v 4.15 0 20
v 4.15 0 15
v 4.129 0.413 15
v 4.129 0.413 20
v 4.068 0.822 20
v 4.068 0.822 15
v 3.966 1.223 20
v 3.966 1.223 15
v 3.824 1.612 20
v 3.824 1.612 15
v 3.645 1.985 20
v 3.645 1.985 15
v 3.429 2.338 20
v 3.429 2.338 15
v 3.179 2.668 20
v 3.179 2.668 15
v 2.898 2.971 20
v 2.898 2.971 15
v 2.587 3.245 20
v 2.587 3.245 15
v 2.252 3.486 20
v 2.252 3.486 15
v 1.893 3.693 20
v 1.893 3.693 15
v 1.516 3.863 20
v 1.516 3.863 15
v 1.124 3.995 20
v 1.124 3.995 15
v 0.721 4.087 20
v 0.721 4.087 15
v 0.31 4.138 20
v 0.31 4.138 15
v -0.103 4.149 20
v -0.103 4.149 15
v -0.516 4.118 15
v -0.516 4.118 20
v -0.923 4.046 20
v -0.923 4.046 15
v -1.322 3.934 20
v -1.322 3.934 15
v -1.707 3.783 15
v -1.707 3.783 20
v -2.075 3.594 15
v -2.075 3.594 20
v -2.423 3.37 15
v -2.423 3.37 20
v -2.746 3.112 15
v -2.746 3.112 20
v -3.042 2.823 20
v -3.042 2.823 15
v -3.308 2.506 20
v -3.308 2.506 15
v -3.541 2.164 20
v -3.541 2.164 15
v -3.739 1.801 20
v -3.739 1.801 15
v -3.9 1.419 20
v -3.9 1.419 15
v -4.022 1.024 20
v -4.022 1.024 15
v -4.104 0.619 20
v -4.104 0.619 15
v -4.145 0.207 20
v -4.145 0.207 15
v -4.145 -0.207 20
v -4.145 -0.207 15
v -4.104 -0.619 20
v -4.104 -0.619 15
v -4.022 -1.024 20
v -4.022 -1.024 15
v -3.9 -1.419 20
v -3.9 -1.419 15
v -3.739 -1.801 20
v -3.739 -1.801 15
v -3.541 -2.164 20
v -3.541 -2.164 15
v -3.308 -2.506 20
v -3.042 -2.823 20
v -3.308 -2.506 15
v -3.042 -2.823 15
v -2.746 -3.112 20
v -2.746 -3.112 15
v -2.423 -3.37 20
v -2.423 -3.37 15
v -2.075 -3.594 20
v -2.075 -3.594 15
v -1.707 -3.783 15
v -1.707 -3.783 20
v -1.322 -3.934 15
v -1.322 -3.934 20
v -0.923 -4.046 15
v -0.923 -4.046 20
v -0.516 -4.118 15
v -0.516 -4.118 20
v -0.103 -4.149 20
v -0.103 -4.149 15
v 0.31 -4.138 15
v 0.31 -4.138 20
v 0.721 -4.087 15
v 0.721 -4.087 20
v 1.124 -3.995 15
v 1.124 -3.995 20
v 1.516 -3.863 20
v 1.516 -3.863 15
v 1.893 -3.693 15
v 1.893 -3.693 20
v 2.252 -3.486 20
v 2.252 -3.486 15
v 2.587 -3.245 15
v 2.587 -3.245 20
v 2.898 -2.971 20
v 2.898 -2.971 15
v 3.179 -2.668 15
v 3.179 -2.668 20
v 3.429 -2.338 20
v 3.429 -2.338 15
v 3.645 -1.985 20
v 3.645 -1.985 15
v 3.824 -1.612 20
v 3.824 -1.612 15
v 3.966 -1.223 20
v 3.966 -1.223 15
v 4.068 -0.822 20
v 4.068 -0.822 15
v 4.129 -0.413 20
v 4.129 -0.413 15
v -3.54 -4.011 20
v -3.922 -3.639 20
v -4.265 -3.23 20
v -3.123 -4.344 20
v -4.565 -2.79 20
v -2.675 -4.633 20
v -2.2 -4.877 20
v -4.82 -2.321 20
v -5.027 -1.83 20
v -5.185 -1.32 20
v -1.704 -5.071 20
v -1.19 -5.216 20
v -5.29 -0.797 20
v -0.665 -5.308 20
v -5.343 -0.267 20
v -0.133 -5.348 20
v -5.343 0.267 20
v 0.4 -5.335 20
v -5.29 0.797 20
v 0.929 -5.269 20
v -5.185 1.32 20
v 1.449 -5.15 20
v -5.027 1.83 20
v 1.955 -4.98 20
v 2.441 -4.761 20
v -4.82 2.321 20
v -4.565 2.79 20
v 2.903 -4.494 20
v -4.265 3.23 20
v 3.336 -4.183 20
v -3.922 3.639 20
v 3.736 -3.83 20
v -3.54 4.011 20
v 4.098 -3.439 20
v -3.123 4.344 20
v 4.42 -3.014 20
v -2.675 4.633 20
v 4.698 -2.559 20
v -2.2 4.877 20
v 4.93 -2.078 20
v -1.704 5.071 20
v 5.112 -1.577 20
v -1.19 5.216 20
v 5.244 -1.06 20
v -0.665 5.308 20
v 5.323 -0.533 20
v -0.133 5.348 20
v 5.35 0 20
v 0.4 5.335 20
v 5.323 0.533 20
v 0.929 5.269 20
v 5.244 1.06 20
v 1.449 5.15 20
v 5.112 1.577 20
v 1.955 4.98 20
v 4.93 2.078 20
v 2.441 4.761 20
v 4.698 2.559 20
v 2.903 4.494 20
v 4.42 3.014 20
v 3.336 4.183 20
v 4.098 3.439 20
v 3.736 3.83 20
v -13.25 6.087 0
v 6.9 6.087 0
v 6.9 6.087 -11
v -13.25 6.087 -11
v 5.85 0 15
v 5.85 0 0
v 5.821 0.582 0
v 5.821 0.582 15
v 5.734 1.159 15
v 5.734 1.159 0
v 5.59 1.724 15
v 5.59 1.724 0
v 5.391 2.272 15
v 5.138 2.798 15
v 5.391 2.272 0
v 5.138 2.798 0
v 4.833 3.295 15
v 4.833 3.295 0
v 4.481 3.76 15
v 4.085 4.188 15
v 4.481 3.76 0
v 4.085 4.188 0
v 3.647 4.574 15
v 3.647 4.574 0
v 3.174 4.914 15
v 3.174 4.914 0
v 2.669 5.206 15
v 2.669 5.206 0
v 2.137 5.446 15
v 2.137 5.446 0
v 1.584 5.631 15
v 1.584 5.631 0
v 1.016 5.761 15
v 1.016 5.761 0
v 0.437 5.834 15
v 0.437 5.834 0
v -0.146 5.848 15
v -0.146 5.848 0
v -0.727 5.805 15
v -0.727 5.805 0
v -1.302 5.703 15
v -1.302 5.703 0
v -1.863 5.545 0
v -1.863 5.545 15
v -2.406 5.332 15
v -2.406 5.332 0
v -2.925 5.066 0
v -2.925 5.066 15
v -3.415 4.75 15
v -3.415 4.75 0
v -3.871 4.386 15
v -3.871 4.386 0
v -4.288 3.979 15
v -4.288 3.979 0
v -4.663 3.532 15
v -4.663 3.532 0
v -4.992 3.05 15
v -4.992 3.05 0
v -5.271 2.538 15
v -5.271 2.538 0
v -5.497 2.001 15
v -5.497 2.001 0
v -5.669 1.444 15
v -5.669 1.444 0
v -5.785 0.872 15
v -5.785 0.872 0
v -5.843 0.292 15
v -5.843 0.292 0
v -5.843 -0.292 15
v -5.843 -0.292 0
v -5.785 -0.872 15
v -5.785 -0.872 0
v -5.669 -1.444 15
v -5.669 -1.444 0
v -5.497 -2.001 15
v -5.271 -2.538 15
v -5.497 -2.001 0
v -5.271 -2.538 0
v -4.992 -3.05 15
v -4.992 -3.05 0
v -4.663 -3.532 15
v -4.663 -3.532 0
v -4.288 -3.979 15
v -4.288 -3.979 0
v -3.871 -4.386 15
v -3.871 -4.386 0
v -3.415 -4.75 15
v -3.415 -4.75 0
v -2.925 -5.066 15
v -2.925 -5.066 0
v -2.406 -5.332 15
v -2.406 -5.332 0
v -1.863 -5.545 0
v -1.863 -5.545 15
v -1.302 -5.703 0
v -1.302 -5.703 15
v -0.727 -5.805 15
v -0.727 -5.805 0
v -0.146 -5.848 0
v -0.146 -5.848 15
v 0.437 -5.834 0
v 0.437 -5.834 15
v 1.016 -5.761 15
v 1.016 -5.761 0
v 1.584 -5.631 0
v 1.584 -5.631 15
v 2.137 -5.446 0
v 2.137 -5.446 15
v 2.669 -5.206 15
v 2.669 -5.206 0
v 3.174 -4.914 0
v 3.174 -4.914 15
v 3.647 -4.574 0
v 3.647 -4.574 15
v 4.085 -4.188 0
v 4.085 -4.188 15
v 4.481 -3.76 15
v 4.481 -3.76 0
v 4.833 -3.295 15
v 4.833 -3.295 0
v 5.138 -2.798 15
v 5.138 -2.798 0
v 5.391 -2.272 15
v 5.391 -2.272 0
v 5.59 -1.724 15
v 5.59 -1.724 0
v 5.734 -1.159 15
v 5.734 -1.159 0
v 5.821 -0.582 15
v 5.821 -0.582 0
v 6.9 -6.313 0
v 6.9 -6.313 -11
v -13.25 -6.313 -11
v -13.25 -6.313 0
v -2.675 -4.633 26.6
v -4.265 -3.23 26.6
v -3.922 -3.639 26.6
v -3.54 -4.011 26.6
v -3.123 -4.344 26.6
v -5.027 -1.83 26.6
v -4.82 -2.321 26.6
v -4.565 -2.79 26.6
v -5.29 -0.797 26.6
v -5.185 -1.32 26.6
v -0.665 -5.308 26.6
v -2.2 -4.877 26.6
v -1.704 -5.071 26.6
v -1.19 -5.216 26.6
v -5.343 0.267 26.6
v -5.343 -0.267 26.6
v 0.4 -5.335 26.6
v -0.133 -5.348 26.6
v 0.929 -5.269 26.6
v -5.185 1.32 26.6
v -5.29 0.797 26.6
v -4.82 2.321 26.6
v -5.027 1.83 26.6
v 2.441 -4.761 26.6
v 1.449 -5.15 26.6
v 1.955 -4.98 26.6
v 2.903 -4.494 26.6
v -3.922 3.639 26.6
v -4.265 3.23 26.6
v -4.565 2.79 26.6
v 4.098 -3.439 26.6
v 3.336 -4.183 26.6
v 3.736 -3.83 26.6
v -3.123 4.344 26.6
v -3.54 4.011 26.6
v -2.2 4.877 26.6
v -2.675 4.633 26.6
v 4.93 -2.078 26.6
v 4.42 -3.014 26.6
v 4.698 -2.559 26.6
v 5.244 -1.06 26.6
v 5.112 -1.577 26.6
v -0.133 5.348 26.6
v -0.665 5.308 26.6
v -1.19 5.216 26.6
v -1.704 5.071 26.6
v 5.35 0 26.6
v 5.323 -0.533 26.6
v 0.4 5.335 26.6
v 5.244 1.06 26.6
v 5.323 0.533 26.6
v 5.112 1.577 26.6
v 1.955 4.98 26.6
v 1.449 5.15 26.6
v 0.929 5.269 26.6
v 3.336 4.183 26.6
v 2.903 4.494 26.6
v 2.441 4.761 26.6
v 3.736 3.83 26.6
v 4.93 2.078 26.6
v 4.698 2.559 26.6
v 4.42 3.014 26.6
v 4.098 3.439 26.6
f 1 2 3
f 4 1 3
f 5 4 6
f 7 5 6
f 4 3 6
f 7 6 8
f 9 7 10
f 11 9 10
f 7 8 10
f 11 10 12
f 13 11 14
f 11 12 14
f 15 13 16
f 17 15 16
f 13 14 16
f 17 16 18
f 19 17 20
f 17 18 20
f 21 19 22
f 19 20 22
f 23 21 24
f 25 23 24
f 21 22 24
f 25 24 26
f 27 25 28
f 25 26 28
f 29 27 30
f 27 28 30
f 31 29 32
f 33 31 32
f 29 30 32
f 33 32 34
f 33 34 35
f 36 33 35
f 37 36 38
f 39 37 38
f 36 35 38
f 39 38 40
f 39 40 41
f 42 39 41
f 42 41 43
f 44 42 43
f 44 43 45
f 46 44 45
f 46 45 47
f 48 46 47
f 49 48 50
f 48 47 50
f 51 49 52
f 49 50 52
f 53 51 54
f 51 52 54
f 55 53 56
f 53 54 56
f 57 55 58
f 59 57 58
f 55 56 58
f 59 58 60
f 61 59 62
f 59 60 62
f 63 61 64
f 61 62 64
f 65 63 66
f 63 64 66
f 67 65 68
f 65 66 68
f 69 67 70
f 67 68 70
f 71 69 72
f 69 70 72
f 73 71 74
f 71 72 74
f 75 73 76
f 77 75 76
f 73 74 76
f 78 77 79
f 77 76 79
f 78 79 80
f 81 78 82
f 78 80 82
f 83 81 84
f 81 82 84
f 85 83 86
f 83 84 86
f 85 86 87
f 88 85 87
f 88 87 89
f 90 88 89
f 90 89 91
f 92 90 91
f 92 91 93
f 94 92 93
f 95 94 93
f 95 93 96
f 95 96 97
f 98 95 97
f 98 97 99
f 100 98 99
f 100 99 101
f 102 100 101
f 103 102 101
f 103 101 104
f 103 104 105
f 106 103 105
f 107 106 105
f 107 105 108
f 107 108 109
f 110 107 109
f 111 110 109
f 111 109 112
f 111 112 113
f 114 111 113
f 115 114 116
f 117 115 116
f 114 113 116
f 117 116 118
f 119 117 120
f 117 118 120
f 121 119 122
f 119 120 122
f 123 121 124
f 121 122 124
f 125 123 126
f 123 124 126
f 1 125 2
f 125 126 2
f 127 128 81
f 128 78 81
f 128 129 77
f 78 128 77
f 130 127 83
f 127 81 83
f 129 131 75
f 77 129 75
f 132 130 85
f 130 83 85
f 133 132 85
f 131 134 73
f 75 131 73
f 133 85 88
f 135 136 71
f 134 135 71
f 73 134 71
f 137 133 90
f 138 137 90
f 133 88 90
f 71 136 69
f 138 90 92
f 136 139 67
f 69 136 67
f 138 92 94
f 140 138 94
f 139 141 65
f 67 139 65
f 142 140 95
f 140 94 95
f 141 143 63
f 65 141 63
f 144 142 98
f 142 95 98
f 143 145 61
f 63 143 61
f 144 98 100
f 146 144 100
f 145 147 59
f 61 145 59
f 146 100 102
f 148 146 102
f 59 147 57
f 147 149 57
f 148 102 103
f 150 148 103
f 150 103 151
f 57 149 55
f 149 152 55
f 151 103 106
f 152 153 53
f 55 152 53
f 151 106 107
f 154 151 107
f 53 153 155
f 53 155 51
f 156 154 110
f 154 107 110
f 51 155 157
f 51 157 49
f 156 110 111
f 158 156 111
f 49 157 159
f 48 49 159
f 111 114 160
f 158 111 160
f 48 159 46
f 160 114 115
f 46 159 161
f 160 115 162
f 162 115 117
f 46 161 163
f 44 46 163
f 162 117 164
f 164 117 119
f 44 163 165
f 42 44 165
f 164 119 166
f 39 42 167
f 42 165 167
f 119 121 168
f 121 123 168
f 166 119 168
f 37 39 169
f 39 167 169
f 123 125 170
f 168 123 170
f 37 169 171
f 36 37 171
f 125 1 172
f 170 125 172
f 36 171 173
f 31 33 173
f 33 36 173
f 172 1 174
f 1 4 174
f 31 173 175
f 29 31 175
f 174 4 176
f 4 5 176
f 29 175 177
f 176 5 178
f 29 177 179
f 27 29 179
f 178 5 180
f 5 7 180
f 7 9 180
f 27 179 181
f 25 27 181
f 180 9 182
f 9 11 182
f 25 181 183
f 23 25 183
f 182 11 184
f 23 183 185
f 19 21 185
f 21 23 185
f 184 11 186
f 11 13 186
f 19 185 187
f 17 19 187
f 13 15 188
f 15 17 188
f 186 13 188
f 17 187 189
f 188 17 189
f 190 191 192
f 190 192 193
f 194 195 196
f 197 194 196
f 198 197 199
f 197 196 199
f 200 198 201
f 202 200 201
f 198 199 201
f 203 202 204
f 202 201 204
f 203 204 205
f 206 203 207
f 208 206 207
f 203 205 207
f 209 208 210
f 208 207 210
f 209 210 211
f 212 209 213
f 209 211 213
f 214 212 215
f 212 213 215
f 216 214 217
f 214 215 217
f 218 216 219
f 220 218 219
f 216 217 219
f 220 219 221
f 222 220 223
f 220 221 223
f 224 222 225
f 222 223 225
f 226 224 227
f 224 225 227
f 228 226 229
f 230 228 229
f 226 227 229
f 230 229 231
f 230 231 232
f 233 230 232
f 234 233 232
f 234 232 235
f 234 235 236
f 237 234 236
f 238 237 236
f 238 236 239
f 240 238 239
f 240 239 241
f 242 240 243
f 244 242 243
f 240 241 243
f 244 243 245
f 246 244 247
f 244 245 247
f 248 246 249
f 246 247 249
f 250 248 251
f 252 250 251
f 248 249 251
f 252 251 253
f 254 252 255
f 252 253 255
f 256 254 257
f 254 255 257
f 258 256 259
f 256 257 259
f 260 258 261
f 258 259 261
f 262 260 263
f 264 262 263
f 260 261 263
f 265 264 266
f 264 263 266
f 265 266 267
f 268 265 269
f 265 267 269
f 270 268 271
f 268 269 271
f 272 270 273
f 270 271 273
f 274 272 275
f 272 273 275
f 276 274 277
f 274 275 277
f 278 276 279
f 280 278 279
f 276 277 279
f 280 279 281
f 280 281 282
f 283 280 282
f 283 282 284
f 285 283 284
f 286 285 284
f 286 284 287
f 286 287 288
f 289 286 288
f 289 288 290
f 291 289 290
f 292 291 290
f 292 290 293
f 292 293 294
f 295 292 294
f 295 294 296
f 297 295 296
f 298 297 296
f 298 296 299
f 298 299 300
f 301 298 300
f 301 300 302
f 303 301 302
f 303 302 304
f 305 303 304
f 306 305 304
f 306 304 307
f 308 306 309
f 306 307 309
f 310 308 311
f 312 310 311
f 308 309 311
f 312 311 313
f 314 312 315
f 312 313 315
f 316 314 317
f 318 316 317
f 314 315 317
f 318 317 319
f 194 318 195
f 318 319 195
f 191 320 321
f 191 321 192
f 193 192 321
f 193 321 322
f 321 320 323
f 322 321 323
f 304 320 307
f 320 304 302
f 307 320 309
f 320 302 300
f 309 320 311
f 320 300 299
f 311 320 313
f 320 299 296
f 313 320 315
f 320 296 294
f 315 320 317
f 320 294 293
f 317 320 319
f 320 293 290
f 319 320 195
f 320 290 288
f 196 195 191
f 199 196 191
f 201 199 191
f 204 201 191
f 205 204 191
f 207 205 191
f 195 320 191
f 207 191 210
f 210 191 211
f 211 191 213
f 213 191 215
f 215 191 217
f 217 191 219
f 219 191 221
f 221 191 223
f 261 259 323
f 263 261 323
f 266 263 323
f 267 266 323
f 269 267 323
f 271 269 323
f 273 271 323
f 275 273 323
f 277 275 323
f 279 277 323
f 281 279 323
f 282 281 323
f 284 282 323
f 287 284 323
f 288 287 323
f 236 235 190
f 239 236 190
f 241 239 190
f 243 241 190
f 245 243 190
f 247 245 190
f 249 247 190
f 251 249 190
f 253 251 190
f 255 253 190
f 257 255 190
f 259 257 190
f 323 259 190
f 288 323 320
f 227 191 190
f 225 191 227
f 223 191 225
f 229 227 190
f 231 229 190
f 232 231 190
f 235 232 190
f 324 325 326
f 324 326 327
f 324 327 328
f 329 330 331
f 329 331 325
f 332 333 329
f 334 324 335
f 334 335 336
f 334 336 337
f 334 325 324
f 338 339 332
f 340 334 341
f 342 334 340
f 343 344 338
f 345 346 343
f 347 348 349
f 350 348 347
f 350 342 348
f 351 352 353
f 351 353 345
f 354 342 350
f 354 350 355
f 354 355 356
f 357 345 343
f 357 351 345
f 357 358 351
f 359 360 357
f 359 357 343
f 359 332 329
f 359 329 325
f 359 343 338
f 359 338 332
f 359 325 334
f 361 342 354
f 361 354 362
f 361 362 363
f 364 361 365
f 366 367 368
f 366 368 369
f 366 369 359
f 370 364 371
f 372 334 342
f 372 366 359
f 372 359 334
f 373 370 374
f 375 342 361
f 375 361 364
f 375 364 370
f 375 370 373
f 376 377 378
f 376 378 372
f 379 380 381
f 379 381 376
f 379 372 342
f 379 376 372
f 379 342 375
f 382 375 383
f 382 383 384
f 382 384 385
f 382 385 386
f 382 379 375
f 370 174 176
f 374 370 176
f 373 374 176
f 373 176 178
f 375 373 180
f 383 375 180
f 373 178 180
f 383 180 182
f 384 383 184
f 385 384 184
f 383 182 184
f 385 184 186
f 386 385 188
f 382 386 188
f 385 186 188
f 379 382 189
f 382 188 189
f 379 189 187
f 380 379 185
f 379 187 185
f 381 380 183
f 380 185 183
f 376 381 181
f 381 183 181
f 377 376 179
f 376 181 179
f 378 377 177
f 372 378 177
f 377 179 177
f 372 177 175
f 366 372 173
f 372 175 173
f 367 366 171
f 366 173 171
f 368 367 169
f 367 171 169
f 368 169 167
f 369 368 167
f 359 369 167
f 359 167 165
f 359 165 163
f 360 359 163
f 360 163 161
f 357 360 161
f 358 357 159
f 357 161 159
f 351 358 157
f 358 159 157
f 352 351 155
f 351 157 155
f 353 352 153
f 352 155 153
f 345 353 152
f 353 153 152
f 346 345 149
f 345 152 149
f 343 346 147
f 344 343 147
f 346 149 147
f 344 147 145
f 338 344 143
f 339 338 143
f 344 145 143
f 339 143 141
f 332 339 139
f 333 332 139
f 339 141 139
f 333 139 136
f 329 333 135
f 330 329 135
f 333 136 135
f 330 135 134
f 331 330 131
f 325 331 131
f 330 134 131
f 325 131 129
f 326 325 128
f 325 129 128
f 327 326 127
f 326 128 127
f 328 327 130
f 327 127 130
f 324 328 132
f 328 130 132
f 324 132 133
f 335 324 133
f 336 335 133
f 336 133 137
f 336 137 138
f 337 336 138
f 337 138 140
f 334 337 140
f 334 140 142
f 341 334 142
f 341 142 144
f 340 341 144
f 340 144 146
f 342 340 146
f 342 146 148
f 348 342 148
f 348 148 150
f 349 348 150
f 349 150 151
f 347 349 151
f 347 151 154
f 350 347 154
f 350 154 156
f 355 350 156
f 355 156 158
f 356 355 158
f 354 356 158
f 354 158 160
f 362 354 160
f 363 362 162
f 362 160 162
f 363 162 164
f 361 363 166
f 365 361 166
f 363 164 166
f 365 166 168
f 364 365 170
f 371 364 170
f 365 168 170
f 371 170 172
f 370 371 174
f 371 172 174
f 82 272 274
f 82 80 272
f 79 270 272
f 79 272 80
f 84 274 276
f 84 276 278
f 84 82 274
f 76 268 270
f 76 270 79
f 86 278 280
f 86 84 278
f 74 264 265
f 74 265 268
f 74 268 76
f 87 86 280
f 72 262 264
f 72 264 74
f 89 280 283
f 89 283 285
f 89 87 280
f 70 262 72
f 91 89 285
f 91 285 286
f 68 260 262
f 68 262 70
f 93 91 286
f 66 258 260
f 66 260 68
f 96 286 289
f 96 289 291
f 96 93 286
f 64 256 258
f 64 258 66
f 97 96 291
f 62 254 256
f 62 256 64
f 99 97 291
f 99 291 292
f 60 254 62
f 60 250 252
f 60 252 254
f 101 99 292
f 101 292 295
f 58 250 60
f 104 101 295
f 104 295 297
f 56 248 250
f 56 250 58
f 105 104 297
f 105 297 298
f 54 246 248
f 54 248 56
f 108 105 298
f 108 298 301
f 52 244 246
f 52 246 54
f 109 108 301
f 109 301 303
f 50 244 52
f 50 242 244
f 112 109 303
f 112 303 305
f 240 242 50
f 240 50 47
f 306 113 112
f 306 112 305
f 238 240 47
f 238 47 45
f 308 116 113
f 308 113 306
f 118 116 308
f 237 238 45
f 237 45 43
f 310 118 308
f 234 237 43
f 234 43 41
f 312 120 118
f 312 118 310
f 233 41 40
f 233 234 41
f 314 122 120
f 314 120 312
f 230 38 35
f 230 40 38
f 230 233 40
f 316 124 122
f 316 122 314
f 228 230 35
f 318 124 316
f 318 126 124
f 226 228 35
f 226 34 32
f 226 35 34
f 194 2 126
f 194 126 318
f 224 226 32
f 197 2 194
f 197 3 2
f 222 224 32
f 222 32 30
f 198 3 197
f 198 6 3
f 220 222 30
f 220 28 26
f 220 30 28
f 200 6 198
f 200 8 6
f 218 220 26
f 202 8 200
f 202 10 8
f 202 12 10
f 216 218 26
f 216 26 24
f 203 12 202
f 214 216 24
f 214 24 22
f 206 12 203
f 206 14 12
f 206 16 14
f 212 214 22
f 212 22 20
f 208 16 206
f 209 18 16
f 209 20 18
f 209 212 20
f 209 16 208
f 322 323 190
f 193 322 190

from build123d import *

# Parameters (mm, degrees)
CROQUIS1_R              = 5.85
SALIENTE_EXTRUIR1_DEPTH = 15
CROQUIS2_R              = 4.15
SALIENTE_EXTRUIR2_DEPTH = 5
CROQUIS3_R              = 5.35
SALIENTE_EXTRUIR3_DEPTH = 6.6
CROQUIS4_W              = 20.15
CROQUIS4_H              = 12.4
SALIENTE_EXTRUIR4_DEPTH = 11


with BuildPart() as part:
    # Croquis1 → Saliente-Extruir1 (new body)
    with BuildSketch(Plane.XY):
        Circle(CROQUIS1_R)
    extrude(amount=SALIENTE_EXTRUIR1_DEPTH)

    # Croquis2 → Saliente-Extruir2 (add)
    with BuildSketch(Plane.XY.offset(15)):
        Circle(CROQUIS2_R)
    extrude(amount=SALIENTE_EXTRUIR2_DEPTH)

    # Croquis3 → Saliente-Extruir3 (add)
    with BuildSketch(Plane.XY.offset(20)):
        Circle(CROQUIS3_R)
    extrude(amount=SALIENTE_EXTRUIR3_DEPTH)

    # Croquis4 → Saliente-Extruir4 (add)
    with BuildSketch(Plane(origin=(0, 0, 0), x_dir=(-1, 0, 0), z_dir=(0, 0, -1))):
        with Locations((3.175, -0.113136053)):
            Rectangle(CROQUIS4_W, CROQUIS4_H)
    extrude(amount=SALIENTE_EXTRUIR4_DEPTH)


solid = part.part
